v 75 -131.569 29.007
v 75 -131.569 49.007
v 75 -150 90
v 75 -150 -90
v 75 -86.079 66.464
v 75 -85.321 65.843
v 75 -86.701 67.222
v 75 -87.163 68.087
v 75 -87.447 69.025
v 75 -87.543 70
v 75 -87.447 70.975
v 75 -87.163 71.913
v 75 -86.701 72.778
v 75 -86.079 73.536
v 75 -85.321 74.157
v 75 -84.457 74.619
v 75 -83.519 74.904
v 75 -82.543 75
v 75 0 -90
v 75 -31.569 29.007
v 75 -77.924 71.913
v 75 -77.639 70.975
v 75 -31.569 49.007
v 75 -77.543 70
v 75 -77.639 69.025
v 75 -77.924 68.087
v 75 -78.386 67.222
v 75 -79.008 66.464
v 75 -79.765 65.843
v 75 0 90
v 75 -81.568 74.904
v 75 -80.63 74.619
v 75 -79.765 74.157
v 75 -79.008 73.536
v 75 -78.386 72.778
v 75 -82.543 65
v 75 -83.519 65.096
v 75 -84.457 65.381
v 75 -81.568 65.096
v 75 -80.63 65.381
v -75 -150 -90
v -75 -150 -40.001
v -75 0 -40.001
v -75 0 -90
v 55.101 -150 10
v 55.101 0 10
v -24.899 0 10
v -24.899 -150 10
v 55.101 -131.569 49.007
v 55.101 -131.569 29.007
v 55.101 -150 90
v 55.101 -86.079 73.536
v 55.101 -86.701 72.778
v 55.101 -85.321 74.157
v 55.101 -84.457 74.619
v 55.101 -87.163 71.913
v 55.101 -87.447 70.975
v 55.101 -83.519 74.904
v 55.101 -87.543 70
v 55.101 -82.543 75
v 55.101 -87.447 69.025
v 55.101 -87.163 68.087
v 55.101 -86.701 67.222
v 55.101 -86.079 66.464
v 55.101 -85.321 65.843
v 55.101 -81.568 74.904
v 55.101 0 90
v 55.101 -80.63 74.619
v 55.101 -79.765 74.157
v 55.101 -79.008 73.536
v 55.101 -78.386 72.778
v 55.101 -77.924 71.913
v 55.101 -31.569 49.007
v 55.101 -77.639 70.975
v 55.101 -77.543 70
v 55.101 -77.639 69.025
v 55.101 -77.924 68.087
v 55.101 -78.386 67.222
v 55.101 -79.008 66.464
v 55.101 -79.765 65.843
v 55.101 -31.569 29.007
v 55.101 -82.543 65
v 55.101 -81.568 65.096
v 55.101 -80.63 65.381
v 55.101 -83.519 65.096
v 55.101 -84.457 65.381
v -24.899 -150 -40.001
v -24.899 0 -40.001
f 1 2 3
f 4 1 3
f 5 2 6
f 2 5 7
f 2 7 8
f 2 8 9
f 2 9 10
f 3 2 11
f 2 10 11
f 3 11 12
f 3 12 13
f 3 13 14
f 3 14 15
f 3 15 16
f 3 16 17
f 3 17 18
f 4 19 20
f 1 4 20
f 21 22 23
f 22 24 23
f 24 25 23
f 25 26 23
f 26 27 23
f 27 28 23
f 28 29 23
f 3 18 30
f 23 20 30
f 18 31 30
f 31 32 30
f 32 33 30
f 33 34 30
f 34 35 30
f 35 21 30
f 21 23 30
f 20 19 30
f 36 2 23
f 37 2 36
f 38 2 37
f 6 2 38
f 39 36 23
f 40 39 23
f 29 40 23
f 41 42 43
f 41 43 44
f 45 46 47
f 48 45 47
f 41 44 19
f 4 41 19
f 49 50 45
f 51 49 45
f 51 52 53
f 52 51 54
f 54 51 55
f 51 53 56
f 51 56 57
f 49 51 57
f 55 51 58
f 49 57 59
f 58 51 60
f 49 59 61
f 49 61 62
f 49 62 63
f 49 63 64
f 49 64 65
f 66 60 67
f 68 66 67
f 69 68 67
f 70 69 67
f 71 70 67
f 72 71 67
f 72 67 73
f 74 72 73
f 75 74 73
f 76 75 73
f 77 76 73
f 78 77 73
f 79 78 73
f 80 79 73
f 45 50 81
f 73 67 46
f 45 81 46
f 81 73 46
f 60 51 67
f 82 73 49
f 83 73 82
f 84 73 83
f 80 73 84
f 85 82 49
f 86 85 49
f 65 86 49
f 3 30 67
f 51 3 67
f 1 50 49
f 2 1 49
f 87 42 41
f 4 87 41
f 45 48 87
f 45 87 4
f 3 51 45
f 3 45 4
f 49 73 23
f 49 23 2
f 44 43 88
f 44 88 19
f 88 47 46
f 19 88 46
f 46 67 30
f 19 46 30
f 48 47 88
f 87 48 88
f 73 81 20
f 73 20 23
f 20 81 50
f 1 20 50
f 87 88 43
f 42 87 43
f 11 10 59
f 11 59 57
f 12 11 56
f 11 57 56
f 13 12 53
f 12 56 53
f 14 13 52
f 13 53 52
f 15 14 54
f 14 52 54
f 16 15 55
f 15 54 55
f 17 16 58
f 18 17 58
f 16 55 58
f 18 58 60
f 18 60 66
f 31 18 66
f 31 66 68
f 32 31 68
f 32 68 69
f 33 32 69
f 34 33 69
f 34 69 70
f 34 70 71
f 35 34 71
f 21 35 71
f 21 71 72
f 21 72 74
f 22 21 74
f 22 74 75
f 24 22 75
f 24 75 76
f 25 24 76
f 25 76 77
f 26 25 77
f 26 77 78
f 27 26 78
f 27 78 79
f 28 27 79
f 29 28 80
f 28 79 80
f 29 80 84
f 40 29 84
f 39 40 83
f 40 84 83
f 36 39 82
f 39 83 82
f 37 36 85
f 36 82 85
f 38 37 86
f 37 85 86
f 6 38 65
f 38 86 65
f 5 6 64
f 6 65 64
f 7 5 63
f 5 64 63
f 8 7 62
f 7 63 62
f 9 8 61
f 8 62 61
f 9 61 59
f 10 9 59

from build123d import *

# Parameters (mm, degrees)
F1_DEPTH = 150
F2_R     = 5
F3_DEPTH = 19.900416
F4_W     = 100
F4_H     = 20
F5_DEPTH = 19.900416


with BuildPart() as f1:
    # F0 (on Front) → F1 (new body)
    with BuildSketch(Plane.XZ):
        Polygon((75, 90), (55.100584, 90), (55.100584, 10), (-24.899416, 10), (-24.899416, -40.001069), (-75, -40.001069), (-75, -90), (75, -90), align=None)
    extrude(amount=F1_DEPTH)

    # F2 (on face) → F3 (cut, through all)
    with BuildSketch(Plane(origin=(55.100584, 0, 0), x_dir=(0, -1, 0), z_dir=(-1, 0, 0))):
        with Locations((82.543276, 70)):
            Circle(F2_R)
    extrude(amount=-F3_DEPTH, mode=Mode.SUBTRACT)

    # F4 (on face) → F5 (cut, through all)
    with BuildSketch(Plane(origin=(55.100584, 0, 0), x_dir=(0, -1, 0), z_dir=(-1, 0, 0))):
        with Locations((81.568733, 39.006799)):
            Rectangle(F4_W, F4_H)
    extrude(amount=-F5_DEPTH, mode=Mode.SUBTRACT)


solid = f1.part
